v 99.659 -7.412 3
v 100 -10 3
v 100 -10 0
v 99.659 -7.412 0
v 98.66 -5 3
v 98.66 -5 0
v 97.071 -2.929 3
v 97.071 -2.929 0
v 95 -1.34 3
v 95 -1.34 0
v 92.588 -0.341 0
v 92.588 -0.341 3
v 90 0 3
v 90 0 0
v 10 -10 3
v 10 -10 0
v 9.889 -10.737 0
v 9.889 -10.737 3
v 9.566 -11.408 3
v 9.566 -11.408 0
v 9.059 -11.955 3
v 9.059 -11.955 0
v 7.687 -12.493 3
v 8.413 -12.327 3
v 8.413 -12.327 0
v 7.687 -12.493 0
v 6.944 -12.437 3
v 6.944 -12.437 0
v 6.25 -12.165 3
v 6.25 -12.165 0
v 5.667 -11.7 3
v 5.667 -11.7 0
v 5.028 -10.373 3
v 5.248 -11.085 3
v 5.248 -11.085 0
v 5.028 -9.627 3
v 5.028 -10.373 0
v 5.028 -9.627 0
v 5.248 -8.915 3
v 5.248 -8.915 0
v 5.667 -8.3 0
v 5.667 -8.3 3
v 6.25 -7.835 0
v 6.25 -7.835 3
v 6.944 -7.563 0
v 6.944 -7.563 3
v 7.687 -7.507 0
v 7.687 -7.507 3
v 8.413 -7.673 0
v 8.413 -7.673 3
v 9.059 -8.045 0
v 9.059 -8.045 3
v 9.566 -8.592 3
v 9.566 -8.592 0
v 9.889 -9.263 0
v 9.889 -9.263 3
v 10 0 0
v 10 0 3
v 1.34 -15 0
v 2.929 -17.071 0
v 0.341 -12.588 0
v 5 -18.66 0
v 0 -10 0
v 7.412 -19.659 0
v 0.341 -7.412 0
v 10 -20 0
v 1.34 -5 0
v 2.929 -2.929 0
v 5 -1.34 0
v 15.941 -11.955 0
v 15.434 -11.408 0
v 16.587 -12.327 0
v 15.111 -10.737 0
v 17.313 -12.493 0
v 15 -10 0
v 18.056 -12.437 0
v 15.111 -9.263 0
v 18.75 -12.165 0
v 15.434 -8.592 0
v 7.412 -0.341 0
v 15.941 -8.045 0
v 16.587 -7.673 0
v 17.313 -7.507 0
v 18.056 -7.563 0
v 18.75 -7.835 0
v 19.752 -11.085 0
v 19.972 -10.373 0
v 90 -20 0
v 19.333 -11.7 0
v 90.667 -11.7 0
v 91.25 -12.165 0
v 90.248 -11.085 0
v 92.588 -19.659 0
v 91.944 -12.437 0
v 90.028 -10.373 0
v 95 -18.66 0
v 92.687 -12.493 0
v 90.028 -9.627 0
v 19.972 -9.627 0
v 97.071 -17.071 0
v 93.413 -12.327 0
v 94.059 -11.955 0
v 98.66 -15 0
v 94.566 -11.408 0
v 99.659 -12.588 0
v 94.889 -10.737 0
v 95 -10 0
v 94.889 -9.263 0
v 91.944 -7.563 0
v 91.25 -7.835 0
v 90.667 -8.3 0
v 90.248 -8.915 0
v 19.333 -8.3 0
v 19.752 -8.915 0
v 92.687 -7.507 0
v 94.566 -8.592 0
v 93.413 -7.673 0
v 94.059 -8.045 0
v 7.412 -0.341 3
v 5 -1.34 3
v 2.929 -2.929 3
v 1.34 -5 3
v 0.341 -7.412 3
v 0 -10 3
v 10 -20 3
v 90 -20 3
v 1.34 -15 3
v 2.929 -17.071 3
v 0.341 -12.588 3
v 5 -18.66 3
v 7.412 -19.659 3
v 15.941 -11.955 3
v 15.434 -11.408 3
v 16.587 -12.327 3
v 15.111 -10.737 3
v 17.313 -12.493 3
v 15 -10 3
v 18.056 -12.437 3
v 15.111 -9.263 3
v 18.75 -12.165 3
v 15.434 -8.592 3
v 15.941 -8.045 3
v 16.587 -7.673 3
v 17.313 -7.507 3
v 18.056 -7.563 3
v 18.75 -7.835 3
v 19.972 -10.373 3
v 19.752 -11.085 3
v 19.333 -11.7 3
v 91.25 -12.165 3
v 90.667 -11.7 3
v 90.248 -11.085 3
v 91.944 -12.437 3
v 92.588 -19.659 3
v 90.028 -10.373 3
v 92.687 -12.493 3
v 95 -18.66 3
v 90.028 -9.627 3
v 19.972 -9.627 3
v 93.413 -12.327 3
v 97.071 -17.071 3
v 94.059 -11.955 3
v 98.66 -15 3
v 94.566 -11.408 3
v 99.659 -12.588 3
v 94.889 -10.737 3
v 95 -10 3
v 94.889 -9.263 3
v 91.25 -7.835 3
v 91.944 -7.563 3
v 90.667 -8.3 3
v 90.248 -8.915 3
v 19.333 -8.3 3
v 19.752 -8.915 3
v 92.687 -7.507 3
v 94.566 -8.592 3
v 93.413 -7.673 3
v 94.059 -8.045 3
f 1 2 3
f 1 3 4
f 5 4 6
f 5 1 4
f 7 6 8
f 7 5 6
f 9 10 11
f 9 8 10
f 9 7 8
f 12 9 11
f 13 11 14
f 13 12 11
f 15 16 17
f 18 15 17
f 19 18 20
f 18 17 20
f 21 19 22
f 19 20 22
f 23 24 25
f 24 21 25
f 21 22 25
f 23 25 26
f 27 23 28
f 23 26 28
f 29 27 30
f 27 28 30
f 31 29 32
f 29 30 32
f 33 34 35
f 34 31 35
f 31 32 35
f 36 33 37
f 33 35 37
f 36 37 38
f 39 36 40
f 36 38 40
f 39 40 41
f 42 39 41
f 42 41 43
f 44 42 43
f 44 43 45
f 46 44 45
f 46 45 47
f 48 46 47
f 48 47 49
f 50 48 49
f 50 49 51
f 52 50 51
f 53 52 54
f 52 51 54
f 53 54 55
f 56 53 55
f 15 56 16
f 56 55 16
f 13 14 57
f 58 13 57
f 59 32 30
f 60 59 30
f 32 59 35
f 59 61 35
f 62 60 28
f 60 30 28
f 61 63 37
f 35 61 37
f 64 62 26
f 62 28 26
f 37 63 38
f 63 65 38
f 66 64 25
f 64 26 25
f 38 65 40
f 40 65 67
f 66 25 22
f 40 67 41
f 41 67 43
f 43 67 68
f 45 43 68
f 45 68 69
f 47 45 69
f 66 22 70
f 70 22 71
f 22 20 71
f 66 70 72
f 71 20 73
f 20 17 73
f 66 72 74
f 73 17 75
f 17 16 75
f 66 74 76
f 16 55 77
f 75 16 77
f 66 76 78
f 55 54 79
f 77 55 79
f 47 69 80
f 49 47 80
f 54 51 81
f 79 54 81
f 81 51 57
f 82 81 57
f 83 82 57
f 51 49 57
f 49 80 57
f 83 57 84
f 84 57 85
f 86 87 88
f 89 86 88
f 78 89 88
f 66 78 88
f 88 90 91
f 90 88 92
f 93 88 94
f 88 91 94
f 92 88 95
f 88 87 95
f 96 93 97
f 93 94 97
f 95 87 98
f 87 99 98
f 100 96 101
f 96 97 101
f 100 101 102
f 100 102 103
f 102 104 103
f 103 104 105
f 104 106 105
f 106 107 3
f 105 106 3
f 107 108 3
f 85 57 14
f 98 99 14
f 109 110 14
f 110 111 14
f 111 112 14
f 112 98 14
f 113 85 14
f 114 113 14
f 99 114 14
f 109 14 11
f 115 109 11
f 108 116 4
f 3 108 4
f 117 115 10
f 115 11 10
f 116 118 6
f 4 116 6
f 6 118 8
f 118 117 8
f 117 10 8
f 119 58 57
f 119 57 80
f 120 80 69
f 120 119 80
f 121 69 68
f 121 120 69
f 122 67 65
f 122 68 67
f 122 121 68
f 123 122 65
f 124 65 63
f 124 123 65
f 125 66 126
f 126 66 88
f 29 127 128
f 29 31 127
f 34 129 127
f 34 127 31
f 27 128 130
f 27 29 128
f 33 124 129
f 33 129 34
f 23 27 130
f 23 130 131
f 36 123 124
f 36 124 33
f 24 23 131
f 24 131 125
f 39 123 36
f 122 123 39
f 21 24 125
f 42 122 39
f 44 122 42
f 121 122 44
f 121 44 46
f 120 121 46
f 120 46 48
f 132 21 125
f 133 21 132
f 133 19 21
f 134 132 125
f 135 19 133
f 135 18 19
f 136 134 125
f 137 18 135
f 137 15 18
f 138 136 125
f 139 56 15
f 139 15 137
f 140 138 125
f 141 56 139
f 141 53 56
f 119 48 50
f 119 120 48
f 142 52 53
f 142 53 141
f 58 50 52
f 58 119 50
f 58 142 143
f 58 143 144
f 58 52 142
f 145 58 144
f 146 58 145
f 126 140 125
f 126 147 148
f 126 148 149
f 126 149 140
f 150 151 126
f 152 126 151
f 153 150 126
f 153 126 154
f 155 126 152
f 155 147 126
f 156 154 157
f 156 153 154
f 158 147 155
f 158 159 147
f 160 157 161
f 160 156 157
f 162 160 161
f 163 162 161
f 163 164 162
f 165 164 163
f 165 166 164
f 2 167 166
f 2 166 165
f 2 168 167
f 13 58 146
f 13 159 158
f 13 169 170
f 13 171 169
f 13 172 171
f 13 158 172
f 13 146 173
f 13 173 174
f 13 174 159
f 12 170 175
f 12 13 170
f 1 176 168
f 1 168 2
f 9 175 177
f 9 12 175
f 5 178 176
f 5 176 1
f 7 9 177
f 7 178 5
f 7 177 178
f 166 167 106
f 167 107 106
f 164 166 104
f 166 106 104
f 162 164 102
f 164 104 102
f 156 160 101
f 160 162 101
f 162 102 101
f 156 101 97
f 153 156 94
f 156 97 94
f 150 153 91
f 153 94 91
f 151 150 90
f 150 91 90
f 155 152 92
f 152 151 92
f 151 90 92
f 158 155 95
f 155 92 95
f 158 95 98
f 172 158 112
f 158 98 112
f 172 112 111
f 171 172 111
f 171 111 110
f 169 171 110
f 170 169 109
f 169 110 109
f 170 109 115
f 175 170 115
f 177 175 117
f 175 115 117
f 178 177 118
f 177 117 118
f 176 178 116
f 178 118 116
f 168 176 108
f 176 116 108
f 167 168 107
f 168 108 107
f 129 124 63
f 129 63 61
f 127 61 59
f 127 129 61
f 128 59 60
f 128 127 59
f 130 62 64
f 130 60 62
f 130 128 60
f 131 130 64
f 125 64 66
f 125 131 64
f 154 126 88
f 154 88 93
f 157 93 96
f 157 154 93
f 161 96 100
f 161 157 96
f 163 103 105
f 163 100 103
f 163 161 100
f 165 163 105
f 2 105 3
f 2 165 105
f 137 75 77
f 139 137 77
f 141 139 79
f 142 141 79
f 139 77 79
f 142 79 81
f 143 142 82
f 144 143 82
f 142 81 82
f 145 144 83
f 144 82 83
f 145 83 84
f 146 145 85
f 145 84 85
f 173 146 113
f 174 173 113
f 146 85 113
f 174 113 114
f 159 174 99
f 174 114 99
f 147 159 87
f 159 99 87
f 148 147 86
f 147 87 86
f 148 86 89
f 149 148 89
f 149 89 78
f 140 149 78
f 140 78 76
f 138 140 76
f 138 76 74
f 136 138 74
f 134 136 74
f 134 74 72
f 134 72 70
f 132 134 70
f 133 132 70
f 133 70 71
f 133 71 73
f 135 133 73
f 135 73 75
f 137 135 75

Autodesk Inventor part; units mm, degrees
ref_plane "YZ Plane" through (0, 0, 0) normal (1, 0, 0) x (0, 1, 0)
ref_plane "XZ Plane" through (0, 0, 0) normal (0, 1, 0) x (-1, 0, 0)
ref_plane "XY Plane" through (0, 0, 0) normal (0, 0, 1) x (1, 0, 0)
sketch "Sketch1" plane through (0, 0, 0) normal (0, 0, 1) x (1, 0, 0)
  line L0 (0, 0) -> (0, -20)
  line L1 (0, -20) -> (100, -20)
  line L2 (100, -20) -> (100, 0)
  line L3 (100, 0) -> (0, 0)
  line L4 (0, 0) -> (0, -10)
  line L5 (0, -10) -> (7.5, -10)
  circle A0 centre (7.5, -10) radius 2.5
  circle A1 centre (92.5, -10) radius 2.5
  dimension "d2" = 10
  dimension "d3" = 7.5
  dimension "d4" = 5
  dimension "d5" = 5
  dimension "d6" = 7.5
extrude "Extrusion1" add sketch "Sketch1" along normal blind 3
fillet "Fillet1" radius 10 1 edges at (100, 0, 1.5)
fillet "Fillet2" radius 10 1 edges at (100, -20, 1.5)
fillet "Fillet3" radius 10 1 edges at (0, -20, 1.5)
fillet "Fillet4" radius 10 1 edges at (0, 0, 1.5)
sketch "Sketch2" plane through (0, 0, 0) normal (0, 0, -1) x (-1, 0, 0)
  circle A0 centre (-7.5, -10) radius 2.5 projected
  circle A1 centre (-17.5, -10) radius 2.5
  point P0 (0, 0)
extrude "Extrusion2" cut sketch "Sketch2" against normal through all contours A1
properties part number "new acr connect" material "Glass"
